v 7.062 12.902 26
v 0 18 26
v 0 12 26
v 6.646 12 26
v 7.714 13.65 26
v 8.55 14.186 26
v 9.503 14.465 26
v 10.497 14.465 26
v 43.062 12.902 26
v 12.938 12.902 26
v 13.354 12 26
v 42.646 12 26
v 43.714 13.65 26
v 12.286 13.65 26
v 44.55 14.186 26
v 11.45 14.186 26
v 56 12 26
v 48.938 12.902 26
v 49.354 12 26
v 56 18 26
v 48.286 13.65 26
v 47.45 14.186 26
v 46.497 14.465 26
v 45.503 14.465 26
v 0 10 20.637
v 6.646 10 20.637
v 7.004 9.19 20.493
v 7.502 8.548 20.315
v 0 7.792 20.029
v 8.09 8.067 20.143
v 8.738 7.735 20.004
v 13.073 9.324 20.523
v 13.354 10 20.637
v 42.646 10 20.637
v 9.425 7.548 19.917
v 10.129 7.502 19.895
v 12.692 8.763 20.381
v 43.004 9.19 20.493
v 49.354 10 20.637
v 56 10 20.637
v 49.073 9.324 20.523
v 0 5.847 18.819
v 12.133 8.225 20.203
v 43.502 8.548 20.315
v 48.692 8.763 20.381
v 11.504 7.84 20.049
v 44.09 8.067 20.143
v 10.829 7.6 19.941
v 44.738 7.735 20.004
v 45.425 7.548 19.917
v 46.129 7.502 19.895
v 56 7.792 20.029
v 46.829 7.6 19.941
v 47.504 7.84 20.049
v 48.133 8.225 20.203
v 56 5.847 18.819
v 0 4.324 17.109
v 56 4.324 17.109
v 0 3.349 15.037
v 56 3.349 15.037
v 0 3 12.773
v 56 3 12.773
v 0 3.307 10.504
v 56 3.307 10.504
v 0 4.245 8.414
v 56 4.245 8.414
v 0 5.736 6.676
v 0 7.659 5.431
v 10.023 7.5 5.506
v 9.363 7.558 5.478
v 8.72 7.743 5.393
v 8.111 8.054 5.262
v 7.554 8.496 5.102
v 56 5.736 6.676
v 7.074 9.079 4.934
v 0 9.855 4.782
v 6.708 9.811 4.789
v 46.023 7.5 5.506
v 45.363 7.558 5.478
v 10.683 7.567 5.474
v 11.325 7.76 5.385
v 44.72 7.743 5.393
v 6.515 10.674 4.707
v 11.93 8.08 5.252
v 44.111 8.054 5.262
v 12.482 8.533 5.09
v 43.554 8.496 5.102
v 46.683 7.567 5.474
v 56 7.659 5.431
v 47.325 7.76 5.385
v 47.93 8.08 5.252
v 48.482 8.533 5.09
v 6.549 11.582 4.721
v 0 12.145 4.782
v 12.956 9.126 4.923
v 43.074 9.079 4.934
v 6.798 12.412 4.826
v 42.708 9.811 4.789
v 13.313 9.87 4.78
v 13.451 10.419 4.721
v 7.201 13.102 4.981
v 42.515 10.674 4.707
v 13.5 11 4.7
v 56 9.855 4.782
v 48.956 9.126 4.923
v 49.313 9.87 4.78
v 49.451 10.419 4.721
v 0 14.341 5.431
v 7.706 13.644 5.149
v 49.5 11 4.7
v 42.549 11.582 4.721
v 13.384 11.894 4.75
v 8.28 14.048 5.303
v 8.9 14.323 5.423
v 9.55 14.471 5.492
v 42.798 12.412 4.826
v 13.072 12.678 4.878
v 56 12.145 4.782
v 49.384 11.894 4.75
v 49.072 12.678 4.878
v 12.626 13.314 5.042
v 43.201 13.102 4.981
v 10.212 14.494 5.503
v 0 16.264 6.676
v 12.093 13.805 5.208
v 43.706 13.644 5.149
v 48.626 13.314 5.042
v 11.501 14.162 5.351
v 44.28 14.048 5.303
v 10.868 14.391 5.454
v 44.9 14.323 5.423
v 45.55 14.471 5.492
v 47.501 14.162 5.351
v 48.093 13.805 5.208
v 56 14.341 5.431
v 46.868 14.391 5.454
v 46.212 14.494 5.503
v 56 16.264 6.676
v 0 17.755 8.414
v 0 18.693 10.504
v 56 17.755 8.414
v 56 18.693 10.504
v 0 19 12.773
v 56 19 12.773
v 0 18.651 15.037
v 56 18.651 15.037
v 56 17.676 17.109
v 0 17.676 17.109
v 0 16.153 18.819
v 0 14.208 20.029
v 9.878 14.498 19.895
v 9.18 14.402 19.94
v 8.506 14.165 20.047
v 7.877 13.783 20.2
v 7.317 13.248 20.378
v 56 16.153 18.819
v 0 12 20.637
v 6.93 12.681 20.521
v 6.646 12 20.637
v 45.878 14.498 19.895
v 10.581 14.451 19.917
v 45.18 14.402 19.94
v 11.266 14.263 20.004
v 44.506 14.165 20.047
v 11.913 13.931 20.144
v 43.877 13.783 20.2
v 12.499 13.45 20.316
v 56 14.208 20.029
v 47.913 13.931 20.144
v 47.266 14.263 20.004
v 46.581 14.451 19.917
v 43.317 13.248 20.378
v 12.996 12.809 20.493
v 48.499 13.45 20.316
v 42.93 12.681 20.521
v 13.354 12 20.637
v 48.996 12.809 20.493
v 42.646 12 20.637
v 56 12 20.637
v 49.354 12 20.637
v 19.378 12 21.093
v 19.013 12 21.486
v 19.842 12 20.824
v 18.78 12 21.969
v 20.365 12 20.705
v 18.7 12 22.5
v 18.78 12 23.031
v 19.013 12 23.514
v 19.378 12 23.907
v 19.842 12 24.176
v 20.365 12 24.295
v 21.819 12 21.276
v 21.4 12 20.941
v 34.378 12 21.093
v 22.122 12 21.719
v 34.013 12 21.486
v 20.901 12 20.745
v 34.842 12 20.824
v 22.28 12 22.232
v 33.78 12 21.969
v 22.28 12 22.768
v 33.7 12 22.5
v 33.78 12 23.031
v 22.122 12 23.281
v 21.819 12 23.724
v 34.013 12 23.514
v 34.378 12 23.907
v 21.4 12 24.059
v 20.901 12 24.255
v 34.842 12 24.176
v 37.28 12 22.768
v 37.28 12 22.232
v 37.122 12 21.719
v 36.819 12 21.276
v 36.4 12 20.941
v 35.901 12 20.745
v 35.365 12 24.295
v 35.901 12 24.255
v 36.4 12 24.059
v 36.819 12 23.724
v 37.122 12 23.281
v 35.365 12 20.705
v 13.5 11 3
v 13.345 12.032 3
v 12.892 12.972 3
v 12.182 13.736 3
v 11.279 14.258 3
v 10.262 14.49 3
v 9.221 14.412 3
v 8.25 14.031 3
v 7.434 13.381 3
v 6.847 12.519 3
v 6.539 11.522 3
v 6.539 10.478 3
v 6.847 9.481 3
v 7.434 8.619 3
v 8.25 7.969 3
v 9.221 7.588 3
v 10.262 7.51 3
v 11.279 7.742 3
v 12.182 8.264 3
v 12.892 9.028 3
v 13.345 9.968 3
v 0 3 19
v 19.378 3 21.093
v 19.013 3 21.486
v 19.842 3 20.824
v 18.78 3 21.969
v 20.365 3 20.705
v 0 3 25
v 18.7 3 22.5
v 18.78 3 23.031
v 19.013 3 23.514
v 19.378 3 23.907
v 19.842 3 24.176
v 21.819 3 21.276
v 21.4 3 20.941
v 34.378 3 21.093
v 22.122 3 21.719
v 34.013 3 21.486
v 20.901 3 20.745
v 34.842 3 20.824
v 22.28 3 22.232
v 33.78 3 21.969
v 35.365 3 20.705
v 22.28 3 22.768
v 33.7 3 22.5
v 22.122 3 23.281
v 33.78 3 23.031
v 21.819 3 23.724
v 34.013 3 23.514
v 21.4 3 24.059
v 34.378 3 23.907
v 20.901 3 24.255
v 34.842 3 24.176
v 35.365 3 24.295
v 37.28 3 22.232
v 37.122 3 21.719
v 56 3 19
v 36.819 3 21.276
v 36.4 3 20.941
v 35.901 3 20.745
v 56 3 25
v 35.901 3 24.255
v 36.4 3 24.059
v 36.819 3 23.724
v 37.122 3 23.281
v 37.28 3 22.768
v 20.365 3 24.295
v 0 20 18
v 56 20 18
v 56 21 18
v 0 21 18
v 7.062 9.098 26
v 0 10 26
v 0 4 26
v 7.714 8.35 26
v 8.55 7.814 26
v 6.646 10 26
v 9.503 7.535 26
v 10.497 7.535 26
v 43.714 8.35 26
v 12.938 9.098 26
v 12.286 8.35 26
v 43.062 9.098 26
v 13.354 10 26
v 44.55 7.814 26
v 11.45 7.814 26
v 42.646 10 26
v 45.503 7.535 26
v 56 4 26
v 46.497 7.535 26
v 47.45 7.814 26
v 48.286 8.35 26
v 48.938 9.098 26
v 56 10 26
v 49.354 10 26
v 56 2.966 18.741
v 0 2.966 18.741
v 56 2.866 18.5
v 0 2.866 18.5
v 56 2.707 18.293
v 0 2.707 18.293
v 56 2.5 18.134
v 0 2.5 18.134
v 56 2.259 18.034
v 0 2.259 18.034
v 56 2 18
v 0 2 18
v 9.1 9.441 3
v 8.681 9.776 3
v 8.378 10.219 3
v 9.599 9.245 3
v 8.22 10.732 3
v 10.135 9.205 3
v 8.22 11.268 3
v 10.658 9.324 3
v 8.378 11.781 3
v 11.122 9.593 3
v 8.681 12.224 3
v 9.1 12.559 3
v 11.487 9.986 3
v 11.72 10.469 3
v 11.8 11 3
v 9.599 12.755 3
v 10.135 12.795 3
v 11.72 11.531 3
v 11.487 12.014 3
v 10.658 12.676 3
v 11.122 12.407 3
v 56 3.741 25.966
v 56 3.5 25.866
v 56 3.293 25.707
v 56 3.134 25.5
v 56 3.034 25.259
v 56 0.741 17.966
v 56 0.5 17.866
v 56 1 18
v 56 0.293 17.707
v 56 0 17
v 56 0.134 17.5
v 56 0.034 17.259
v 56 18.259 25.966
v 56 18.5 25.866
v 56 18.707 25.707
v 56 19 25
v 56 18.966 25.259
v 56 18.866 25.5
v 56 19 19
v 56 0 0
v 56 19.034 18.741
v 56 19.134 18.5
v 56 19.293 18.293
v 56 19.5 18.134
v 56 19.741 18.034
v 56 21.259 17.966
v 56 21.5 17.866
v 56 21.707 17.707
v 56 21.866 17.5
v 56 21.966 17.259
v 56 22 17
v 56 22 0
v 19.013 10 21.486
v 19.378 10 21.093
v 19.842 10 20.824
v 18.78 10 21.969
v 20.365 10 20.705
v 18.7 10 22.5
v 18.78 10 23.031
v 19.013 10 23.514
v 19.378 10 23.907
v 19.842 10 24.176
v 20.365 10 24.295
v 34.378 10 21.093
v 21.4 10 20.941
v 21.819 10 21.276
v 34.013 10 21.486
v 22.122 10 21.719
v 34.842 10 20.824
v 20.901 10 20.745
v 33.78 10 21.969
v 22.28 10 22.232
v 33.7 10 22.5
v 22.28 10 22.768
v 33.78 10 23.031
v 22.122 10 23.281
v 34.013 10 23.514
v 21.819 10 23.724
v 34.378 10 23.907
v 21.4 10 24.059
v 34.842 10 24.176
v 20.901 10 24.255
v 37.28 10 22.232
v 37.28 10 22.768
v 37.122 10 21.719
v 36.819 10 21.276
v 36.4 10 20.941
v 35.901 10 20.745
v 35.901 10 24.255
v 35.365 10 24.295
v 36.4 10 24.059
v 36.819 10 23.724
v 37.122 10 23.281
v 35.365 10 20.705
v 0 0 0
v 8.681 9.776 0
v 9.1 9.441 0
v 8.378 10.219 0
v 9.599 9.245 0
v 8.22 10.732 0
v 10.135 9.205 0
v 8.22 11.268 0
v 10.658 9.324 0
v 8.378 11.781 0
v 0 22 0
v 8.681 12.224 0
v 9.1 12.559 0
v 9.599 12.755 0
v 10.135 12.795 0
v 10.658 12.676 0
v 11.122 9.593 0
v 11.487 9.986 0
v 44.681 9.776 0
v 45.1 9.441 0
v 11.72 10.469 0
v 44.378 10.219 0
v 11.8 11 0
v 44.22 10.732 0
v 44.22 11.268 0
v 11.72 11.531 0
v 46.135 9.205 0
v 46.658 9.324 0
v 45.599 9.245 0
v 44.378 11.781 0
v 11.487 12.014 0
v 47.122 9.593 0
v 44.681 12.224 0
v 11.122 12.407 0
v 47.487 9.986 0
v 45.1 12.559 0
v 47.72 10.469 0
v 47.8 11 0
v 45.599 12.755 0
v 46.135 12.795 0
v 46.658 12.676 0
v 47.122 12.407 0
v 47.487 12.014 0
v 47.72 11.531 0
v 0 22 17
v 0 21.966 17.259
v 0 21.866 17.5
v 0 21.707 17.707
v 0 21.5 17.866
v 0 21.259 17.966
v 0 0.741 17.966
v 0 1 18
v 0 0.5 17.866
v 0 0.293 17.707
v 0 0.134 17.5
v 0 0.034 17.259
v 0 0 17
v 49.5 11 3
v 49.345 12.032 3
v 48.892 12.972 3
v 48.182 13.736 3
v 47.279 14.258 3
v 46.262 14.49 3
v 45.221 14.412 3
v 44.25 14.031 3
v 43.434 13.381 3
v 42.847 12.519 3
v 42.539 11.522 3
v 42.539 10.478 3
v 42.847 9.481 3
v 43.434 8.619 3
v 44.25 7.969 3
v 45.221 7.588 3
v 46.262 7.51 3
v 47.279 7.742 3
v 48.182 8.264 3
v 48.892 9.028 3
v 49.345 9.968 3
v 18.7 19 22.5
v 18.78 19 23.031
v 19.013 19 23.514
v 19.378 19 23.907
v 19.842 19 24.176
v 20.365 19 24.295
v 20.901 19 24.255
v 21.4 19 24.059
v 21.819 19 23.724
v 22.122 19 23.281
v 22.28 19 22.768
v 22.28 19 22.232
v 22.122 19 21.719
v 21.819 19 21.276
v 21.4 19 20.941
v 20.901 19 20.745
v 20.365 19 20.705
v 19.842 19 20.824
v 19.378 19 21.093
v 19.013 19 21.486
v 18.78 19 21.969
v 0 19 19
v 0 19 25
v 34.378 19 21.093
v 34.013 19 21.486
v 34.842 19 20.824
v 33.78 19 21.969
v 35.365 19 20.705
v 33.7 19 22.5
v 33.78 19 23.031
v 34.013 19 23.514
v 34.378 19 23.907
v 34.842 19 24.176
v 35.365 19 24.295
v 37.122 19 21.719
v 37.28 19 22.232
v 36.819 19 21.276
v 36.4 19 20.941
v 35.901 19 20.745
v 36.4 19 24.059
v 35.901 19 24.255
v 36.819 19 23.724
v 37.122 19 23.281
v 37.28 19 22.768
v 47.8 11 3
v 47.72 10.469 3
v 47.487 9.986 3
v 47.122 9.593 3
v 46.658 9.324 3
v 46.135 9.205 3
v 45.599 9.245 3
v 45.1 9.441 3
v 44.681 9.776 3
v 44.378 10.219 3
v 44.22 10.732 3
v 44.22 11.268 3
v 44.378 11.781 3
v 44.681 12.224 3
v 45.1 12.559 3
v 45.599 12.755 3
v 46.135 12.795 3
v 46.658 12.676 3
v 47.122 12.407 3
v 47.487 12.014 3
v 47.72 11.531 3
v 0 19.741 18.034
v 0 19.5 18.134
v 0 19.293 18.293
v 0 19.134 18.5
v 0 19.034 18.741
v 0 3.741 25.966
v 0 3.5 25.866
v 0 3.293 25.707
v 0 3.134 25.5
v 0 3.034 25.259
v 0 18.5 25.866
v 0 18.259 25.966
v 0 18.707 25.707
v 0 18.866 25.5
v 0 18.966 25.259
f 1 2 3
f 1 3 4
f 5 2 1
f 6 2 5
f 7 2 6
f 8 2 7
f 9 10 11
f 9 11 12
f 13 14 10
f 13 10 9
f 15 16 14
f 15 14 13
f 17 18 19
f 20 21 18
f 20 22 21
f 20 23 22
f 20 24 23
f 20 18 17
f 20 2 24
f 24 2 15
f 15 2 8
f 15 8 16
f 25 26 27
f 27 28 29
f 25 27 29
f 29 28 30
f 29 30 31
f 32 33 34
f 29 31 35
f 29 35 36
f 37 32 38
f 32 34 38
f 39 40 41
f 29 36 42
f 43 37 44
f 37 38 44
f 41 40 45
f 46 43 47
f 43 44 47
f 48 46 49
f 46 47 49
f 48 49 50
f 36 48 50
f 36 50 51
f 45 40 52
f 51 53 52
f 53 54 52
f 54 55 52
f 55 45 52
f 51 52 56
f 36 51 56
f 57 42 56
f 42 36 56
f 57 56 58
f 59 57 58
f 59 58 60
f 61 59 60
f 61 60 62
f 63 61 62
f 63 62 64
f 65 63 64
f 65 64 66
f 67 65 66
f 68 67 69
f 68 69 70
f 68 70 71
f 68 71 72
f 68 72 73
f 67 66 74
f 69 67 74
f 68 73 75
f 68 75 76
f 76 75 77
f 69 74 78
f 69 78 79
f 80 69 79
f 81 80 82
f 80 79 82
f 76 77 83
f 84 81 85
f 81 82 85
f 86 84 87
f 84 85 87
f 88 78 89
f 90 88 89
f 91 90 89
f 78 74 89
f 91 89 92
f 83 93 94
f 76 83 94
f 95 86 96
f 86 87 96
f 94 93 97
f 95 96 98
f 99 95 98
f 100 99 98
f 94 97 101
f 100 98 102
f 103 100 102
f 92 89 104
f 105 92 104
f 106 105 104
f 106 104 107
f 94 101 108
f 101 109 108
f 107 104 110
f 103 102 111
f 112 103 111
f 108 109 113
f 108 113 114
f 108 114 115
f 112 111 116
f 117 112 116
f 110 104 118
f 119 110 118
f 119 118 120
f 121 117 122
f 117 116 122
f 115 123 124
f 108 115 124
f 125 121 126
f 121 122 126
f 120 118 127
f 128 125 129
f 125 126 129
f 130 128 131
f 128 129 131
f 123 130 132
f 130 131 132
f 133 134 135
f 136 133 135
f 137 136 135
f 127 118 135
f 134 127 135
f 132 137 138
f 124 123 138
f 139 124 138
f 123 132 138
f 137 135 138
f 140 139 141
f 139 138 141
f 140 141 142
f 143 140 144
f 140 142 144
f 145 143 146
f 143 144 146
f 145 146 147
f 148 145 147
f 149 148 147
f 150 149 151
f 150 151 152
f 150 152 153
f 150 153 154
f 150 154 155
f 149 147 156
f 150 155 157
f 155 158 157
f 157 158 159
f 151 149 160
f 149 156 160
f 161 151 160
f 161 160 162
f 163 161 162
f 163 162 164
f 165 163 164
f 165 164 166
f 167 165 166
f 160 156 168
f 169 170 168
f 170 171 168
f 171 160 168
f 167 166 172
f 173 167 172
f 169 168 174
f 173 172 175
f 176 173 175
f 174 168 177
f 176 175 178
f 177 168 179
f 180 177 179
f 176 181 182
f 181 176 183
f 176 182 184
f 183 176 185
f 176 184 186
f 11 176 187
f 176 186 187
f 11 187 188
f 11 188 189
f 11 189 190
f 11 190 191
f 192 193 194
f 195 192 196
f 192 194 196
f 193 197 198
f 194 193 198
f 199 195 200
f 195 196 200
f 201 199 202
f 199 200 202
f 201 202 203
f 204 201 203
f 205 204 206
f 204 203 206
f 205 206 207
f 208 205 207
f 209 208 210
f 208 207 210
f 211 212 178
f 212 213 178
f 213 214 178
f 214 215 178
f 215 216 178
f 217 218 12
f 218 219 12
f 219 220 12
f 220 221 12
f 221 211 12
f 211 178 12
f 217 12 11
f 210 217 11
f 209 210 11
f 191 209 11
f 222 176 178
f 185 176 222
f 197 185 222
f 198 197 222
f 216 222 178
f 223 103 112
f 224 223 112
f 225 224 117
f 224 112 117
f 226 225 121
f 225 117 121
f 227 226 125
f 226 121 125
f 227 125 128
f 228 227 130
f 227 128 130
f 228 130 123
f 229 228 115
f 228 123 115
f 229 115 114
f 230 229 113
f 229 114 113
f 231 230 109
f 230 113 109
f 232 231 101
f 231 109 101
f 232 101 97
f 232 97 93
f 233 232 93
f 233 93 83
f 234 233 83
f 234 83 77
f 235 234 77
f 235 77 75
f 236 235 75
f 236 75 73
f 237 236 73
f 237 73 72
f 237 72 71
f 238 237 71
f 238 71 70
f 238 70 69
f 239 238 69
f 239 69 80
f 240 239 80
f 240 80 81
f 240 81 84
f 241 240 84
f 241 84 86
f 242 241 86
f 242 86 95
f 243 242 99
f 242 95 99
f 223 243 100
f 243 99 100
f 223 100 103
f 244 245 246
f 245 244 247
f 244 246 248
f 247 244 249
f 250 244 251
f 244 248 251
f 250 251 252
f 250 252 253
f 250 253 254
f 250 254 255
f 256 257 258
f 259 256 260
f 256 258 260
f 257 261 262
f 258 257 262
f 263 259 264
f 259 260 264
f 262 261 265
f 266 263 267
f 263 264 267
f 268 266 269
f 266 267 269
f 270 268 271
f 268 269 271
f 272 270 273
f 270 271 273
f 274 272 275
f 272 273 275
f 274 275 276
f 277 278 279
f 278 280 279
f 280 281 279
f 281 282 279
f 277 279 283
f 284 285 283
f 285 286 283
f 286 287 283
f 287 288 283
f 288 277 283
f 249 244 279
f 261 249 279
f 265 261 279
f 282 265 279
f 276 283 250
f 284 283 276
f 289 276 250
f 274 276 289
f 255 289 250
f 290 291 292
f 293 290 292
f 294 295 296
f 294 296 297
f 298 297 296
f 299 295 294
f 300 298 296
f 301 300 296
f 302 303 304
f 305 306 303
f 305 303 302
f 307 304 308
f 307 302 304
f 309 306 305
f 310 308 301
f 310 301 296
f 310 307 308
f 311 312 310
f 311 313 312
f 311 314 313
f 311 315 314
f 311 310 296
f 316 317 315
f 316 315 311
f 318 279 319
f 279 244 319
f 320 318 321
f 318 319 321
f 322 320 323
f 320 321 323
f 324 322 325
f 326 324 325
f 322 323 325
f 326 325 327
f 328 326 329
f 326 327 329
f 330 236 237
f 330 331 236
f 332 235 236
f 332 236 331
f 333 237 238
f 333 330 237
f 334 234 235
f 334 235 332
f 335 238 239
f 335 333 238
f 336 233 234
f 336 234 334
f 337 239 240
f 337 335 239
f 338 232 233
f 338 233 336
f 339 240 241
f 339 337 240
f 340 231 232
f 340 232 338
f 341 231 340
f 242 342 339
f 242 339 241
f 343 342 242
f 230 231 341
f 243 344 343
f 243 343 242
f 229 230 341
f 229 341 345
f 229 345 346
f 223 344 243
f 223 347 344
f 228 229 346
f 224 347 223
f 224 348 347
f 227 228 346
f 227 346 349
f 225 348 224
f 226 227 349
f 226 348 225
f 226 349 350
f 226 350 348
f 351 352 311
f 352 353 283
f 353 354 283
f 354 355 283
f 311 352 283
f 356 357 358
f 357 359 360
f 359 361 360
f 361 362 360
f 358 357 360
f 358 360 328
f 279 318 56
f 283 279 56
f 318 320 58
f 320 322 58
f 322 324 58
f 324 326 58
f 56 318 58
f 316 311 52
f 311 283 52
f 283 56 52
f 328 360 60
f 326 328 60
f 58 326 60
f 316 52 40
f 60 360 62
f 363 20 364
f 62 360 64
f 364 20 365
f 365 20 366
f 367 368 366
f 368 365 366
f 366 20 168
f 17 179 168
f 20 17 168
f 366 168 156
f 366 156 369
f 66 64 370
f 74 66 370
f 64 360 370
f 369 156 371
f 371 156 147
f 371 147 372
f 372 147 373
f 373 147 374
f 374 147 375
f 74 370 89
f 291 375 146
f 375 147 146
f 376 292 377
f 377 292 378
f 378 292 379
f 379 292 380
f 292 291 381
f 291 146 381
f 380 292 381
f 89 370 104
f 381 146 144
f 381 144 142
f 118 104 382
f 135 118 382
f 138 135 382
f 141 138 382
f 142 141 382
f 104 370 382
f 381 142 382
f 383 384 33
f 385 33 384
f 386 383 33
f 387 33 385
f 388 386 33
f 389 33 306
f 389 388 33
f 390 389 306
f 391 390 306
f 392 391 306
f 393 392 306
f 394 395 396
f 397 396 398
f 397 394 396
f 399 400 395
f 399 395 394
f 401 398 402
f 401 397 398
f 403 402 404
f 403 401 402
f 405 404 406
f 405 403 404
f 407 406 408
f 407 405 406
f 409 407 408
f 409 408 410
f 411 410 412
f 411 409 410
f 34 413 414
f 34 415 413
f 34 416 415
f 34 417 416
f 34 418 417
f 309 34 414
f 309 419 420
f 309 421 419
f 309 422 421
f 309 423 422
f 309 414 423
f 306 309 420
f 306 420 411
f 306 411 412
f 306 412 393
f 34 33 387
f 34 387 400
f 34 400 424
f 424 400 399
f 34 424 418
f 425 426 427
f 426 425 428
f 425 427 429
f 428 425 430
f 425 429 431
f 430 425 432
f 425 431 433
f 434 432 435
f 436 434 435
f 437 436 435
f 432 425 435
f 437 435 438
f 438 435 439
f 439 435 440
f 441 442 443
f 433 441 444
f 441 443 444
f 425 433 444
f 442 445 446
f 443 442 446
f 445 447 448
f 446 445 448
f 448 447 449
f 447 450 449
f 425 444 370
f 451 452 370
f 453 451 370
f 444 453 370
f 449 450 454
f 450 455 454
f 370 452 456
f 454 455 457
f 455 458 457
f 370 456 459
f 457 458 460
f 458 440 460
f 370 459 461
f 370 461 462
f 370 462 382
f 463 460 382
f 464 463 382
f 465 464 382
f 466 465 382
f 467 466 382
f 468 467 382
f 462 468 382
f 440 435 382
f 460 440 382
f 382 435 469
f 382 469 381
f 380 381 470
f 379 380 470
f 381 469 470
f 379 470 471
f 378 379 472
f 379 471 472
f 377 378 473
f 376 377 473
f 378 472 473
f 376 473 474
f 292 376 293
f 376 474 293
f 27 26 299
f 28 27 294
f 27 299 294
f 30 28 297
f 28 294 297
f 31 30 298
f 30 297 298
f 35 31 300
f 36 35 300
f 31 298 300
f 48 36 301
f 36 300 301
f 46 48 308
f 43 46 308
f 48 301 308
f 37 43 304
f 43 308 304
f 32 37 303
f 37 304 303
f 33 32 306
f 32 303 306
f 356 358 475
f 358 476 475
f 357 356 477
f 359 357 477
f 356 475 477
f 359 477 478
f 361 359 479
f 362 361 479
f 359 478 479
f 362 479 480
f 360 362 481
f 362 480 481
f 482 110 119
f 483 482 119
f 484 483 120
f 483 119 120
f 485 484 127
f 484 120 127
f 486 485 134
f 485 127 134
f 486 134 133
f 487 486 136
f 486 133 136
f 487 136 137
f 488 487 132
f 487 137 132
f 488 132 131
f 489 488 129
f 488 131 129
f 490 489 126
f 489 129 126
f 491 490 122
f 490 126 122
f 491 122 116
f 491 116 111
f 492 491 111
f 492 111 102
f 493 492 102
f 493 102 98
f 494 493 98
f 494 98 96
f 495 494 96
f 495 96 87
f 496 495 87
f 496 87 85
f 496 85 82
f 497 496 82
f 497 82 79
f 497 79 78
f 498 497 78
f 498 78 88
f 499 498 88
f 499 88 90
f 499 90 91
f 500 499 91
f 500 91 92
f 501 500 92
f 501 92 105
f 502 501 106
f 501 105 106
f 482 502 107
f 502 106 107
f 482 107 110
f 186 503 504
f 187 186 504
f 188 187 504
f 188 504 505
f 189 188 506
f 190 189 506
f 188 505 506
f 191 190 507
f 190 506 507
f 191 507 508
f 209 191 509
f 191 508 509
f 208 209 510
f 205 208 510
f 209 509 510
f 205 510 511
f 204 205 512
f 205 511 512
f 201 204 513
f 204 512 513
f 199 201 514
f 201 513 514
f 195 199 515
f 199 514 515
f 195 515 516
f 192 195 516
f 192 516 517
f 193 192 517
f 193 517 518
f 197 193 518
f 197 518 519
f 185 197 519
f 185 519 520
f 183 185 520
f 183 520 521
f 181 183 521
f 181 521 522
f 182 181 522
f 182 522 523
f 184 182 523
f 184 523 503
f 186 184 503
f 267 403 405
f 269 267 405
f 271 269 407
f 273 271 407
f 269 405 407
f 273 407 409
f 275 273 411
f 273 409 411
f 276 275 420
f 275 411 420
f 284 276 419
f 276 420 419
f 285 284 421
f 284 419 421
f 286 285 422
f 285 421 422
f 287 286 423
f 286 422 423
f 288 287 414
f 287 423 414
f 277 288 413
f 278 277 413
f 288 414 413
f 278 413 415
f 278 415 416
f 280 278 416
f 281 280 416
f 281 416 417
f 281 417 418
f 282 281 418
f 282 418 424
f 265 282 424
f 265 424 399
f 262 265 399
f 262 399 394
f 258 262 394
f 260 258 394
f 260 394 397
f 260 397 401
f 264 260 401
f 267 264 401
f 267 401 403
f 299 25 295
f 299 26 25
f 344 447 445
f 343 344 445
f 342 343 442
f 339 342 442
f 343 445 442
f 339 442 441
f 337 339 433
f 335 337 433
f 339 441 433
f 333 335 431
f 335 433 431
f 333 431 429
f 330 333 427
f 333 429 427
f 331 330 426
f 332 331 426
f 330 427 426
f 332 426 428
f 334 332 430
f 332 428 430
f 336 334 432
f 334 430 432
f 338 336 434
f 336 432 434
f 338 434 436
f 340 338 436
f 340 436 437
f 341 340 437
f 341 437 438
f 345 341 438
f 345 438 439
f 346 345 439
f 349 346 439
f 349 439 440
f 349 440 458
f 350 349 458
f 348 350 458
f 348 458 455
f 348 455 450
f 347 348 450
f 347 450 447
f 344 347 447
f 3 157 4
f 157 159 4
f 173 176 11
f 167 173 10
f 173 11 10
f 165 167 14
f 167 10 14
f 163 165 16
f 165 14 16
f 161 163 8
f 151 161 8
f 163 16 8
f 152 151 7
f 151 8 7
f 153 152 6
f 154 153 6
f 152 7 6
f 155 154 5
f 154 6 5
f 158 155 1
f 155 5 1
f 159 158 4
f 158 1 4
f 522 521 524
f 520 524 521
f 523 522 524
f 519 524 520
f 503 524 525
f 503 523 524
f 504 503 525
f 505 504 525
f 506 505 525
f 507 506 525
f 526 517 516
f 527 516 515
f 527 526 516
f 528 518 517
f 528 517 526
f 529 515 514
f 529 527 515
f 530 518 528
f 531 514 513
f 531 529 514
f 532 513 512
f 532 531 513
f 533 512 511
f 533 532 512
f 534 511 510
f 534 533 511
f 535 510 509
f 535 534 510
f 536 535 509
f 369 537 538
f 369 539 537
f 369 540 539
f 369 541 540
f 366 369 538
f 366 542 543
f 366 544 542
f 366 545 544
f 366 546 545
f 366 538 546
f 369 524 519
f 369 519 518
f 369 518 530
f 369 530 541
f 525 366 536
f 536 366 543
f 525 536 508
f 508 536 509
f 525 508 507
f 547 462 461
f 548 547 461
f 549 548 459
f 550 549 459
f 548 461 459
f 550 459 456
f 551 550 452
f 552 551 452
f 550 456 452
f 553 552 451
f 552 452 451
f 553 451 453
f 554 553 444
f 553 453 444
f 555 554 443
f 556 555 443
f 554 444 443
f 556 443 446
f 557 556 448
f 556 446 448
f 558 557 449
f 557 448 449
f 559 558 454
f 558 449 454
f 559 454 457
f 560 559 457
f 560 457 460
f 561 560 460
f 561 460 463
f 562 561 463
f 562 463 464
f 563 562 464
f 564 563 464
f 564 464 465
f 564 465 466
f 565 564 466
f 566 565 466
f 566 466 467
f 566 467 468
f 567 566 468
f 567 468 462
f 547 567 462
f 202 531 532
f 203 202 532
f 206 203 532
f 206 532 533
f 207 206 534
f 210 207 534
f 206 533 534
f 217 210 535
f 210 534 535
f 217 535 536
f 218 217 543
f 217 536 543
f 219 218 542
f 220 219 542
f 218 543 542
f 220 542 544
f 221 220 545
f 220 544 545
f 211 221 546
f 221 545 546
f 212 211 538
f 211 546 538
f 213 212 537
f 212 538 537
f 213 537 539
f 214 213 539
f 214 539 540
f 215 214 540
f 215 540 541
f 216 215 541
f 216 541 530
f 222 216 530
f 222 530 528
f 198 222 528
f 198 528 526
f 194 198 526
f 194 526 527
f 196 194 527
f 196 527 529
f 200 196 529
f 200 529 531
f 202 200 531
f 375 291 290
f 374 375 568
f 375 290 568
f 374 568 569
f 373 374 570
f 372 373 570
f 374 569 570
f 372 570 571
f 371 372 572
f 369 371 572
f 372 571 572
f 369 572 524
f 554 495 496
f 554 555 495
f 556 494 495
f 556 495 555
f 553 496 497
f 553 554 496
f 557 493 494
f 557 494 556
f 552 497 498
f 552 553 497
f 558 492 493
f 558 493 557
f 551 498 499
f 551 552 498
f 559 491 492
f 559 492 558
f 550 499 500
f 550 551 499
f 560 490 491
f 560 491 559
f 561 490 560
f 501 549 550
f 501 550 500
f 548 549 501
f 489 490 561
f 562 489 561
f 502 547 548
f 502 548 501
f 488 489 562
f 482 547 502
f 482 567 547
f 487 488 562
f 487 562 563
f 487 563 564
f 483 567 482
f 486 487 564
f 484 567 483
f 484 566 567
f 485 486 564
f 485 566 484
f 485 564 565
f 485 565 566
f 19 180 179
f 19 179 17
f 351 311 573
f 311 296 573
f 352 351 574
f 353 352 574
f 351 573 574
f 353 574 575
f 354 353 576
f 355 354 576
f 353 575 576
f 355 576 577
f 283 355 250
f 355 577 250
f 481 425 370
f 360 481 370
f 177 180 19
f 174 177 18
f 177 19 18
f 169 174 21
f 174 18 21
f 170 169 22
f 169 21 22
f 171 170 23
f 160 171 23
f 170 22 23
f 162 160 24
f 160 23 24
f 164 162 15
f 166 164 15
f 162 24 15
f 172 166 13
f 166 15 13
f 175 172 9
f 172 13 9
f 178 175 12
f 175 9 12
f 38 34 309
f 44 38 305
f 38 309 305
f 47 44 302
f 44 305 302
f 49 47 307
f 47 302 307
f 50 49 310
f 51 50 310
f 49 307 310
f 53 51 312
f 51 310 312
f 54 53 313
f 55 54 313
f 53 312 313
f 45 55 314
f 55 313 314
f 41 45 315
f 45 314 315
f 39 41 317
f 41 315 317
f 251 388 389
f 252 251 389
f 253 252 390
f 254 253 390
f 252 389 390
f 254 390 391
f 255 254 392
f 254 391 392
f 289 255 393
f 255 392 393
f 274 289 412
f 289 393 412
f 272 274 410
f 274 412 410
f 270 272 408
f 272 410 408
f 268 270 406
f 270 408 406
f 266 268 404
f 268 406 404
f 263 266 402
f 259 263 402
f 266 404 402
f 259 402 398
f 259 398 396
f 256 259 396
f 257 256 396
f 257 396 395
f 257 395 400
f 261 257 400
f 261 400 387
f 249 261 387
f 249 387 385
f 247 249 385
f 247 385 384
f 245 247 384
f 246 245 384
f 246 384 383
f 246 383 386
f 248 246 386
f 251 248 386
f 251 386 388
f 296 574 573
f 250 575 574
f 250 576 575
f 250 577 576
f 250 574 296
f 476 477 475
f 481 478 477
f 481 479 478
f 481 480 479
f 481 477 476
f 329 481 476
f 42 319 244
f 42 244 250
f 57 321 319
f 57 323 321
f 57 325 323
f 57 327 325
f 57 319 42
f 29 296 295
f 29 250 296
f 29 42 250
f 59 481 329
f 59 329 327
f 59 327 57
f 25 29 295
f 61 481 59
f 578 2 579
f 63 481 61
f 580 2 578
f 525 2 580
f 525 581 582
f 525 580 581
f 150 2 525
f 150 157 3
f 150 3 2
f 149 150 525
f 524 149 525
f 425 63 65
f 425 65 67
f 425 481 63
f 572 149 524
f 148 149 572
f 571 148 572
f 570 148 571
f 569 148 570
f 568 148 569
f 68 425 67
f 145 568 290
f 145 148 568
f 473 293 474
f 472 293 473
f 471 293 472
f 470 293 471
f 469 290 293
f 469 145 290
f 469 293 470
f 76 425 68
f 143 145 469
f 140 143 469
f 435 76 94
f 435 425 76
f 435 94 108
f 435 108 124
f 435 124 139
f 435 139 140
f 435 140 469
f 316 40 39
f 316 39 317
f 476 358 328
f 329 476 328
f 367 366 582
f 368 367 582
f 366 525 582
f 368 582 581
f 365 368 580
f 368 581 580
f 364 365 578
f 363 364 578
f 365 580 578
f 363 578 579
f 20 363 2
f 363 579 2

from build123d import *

# Parameters (mm, degrees)
BOX_W           = 56
BOX_H           = 22
BOX_DEPTH       = 26
SKETCH_R        = 8
POCKET_DEPTH    = 56.001
SKETCH001_R     = 3.5
POCKET001_DEPTH = 23
SKETCH002_R     = 1.8
POCKET002_DEPTH = 5
SKETCH003_R     = 1.8
POCKET003_DEPTH = 22.001
SKETCH004_W     = 2
SKETCH004_H     = 11.298807
SKETCH004_W_2   = 3
SKETCH004_H_2   = 8
POCKET004_DEPTH = 56.001
FILLET_R        = 1


with BuildPart() as part:
    # Box → Box (new body)
    with BuildSketch(Plane.XY):
        with Locations((28, 11)):
            Rectangle(BOX_W, BOX_H)
    extrude(amount=BOX_DEPTH)

    # Sketch → Pocket (cut, through all)
    with BuildSketch(Plane.YZ.offset(56)):
        with Locations((11, 12.7)):
            Circle(SKETCH_R)
    extrude(amount=-POCKET_DEPTH, mode=Mode.SUBTRACT)

    # Sketch001 → Pocket001 (cut)
    with BuildSketch(Plane.XY.offset(26)):
        with Locations((10, 11)):
            Circle(SKETCH001_R)
        with Locations((46, 11)):
            Circle(SKETCH001_R)
    extrude(amount=-POCKET001_DEPTH, mode=Mode.SUBTRACT)

    # Sketch002 → Pocket002 (cut)
    with BuildSketch(Plane(origin=(0, 0, 0), x_dir=(1, 0, 0), z_dir=(0, 0, -1))):
        with Locations((10, -11)):
            Circle(SKETCH002_R)
        with Locations((46, -11)):
            Circle(SKETCH002_R)
    extrude(amount=-POCKET002_DEPTH, mode=Mode.SUBTRACT)

    # Sketch003 → Pocket003 (cut, through all)
    with BuildSketch(Plane(origin=(0, 22, 0), x_dir=(-1, 0, 0), z_dir=(0, 1, 0))):
        with Locations((-35.5, 22.5)):
            Circle(SKETCH003_R)
        with Locations((-20.5, 22.5)):
            Circle(SKETCH003_R)
    extrude(amount=-POCKET003_DEPTH, mode=Mode.SUBTRACT)

    # Sketch004 → Pocket004 (cut, through all)
    with BuildSketch(Plane.YZ.offset(56)):
        with Locations((11, 23.747477)):
            Rectangle(SKETCH004_W, SKETCH004_H)
        with Locations((1.5, 22)):
            Rectangle(SKETCH004_W_2, SKETCH004_H_2)
        with Locations((20.5, 22)):
            Rectangle(SKETCH004_W_2, SKETCH004_H_2)
    extrude(amount=-POCKET004_DEPTH, mode=Mode.SUBTRACT)

    # Fillet
    fillet_edges = [part.edges().sort_by_distance(p)[0] for p in [
        (28, 0, 18),
        (28, 3, 18),
        (28, 3, 26),
        (28, 19, 26),
        (28, 19, 18),
        (28, 22, 18),
    ]]
    fillet(fillet_edges, radius=FILLET_R)


solid = part.part
